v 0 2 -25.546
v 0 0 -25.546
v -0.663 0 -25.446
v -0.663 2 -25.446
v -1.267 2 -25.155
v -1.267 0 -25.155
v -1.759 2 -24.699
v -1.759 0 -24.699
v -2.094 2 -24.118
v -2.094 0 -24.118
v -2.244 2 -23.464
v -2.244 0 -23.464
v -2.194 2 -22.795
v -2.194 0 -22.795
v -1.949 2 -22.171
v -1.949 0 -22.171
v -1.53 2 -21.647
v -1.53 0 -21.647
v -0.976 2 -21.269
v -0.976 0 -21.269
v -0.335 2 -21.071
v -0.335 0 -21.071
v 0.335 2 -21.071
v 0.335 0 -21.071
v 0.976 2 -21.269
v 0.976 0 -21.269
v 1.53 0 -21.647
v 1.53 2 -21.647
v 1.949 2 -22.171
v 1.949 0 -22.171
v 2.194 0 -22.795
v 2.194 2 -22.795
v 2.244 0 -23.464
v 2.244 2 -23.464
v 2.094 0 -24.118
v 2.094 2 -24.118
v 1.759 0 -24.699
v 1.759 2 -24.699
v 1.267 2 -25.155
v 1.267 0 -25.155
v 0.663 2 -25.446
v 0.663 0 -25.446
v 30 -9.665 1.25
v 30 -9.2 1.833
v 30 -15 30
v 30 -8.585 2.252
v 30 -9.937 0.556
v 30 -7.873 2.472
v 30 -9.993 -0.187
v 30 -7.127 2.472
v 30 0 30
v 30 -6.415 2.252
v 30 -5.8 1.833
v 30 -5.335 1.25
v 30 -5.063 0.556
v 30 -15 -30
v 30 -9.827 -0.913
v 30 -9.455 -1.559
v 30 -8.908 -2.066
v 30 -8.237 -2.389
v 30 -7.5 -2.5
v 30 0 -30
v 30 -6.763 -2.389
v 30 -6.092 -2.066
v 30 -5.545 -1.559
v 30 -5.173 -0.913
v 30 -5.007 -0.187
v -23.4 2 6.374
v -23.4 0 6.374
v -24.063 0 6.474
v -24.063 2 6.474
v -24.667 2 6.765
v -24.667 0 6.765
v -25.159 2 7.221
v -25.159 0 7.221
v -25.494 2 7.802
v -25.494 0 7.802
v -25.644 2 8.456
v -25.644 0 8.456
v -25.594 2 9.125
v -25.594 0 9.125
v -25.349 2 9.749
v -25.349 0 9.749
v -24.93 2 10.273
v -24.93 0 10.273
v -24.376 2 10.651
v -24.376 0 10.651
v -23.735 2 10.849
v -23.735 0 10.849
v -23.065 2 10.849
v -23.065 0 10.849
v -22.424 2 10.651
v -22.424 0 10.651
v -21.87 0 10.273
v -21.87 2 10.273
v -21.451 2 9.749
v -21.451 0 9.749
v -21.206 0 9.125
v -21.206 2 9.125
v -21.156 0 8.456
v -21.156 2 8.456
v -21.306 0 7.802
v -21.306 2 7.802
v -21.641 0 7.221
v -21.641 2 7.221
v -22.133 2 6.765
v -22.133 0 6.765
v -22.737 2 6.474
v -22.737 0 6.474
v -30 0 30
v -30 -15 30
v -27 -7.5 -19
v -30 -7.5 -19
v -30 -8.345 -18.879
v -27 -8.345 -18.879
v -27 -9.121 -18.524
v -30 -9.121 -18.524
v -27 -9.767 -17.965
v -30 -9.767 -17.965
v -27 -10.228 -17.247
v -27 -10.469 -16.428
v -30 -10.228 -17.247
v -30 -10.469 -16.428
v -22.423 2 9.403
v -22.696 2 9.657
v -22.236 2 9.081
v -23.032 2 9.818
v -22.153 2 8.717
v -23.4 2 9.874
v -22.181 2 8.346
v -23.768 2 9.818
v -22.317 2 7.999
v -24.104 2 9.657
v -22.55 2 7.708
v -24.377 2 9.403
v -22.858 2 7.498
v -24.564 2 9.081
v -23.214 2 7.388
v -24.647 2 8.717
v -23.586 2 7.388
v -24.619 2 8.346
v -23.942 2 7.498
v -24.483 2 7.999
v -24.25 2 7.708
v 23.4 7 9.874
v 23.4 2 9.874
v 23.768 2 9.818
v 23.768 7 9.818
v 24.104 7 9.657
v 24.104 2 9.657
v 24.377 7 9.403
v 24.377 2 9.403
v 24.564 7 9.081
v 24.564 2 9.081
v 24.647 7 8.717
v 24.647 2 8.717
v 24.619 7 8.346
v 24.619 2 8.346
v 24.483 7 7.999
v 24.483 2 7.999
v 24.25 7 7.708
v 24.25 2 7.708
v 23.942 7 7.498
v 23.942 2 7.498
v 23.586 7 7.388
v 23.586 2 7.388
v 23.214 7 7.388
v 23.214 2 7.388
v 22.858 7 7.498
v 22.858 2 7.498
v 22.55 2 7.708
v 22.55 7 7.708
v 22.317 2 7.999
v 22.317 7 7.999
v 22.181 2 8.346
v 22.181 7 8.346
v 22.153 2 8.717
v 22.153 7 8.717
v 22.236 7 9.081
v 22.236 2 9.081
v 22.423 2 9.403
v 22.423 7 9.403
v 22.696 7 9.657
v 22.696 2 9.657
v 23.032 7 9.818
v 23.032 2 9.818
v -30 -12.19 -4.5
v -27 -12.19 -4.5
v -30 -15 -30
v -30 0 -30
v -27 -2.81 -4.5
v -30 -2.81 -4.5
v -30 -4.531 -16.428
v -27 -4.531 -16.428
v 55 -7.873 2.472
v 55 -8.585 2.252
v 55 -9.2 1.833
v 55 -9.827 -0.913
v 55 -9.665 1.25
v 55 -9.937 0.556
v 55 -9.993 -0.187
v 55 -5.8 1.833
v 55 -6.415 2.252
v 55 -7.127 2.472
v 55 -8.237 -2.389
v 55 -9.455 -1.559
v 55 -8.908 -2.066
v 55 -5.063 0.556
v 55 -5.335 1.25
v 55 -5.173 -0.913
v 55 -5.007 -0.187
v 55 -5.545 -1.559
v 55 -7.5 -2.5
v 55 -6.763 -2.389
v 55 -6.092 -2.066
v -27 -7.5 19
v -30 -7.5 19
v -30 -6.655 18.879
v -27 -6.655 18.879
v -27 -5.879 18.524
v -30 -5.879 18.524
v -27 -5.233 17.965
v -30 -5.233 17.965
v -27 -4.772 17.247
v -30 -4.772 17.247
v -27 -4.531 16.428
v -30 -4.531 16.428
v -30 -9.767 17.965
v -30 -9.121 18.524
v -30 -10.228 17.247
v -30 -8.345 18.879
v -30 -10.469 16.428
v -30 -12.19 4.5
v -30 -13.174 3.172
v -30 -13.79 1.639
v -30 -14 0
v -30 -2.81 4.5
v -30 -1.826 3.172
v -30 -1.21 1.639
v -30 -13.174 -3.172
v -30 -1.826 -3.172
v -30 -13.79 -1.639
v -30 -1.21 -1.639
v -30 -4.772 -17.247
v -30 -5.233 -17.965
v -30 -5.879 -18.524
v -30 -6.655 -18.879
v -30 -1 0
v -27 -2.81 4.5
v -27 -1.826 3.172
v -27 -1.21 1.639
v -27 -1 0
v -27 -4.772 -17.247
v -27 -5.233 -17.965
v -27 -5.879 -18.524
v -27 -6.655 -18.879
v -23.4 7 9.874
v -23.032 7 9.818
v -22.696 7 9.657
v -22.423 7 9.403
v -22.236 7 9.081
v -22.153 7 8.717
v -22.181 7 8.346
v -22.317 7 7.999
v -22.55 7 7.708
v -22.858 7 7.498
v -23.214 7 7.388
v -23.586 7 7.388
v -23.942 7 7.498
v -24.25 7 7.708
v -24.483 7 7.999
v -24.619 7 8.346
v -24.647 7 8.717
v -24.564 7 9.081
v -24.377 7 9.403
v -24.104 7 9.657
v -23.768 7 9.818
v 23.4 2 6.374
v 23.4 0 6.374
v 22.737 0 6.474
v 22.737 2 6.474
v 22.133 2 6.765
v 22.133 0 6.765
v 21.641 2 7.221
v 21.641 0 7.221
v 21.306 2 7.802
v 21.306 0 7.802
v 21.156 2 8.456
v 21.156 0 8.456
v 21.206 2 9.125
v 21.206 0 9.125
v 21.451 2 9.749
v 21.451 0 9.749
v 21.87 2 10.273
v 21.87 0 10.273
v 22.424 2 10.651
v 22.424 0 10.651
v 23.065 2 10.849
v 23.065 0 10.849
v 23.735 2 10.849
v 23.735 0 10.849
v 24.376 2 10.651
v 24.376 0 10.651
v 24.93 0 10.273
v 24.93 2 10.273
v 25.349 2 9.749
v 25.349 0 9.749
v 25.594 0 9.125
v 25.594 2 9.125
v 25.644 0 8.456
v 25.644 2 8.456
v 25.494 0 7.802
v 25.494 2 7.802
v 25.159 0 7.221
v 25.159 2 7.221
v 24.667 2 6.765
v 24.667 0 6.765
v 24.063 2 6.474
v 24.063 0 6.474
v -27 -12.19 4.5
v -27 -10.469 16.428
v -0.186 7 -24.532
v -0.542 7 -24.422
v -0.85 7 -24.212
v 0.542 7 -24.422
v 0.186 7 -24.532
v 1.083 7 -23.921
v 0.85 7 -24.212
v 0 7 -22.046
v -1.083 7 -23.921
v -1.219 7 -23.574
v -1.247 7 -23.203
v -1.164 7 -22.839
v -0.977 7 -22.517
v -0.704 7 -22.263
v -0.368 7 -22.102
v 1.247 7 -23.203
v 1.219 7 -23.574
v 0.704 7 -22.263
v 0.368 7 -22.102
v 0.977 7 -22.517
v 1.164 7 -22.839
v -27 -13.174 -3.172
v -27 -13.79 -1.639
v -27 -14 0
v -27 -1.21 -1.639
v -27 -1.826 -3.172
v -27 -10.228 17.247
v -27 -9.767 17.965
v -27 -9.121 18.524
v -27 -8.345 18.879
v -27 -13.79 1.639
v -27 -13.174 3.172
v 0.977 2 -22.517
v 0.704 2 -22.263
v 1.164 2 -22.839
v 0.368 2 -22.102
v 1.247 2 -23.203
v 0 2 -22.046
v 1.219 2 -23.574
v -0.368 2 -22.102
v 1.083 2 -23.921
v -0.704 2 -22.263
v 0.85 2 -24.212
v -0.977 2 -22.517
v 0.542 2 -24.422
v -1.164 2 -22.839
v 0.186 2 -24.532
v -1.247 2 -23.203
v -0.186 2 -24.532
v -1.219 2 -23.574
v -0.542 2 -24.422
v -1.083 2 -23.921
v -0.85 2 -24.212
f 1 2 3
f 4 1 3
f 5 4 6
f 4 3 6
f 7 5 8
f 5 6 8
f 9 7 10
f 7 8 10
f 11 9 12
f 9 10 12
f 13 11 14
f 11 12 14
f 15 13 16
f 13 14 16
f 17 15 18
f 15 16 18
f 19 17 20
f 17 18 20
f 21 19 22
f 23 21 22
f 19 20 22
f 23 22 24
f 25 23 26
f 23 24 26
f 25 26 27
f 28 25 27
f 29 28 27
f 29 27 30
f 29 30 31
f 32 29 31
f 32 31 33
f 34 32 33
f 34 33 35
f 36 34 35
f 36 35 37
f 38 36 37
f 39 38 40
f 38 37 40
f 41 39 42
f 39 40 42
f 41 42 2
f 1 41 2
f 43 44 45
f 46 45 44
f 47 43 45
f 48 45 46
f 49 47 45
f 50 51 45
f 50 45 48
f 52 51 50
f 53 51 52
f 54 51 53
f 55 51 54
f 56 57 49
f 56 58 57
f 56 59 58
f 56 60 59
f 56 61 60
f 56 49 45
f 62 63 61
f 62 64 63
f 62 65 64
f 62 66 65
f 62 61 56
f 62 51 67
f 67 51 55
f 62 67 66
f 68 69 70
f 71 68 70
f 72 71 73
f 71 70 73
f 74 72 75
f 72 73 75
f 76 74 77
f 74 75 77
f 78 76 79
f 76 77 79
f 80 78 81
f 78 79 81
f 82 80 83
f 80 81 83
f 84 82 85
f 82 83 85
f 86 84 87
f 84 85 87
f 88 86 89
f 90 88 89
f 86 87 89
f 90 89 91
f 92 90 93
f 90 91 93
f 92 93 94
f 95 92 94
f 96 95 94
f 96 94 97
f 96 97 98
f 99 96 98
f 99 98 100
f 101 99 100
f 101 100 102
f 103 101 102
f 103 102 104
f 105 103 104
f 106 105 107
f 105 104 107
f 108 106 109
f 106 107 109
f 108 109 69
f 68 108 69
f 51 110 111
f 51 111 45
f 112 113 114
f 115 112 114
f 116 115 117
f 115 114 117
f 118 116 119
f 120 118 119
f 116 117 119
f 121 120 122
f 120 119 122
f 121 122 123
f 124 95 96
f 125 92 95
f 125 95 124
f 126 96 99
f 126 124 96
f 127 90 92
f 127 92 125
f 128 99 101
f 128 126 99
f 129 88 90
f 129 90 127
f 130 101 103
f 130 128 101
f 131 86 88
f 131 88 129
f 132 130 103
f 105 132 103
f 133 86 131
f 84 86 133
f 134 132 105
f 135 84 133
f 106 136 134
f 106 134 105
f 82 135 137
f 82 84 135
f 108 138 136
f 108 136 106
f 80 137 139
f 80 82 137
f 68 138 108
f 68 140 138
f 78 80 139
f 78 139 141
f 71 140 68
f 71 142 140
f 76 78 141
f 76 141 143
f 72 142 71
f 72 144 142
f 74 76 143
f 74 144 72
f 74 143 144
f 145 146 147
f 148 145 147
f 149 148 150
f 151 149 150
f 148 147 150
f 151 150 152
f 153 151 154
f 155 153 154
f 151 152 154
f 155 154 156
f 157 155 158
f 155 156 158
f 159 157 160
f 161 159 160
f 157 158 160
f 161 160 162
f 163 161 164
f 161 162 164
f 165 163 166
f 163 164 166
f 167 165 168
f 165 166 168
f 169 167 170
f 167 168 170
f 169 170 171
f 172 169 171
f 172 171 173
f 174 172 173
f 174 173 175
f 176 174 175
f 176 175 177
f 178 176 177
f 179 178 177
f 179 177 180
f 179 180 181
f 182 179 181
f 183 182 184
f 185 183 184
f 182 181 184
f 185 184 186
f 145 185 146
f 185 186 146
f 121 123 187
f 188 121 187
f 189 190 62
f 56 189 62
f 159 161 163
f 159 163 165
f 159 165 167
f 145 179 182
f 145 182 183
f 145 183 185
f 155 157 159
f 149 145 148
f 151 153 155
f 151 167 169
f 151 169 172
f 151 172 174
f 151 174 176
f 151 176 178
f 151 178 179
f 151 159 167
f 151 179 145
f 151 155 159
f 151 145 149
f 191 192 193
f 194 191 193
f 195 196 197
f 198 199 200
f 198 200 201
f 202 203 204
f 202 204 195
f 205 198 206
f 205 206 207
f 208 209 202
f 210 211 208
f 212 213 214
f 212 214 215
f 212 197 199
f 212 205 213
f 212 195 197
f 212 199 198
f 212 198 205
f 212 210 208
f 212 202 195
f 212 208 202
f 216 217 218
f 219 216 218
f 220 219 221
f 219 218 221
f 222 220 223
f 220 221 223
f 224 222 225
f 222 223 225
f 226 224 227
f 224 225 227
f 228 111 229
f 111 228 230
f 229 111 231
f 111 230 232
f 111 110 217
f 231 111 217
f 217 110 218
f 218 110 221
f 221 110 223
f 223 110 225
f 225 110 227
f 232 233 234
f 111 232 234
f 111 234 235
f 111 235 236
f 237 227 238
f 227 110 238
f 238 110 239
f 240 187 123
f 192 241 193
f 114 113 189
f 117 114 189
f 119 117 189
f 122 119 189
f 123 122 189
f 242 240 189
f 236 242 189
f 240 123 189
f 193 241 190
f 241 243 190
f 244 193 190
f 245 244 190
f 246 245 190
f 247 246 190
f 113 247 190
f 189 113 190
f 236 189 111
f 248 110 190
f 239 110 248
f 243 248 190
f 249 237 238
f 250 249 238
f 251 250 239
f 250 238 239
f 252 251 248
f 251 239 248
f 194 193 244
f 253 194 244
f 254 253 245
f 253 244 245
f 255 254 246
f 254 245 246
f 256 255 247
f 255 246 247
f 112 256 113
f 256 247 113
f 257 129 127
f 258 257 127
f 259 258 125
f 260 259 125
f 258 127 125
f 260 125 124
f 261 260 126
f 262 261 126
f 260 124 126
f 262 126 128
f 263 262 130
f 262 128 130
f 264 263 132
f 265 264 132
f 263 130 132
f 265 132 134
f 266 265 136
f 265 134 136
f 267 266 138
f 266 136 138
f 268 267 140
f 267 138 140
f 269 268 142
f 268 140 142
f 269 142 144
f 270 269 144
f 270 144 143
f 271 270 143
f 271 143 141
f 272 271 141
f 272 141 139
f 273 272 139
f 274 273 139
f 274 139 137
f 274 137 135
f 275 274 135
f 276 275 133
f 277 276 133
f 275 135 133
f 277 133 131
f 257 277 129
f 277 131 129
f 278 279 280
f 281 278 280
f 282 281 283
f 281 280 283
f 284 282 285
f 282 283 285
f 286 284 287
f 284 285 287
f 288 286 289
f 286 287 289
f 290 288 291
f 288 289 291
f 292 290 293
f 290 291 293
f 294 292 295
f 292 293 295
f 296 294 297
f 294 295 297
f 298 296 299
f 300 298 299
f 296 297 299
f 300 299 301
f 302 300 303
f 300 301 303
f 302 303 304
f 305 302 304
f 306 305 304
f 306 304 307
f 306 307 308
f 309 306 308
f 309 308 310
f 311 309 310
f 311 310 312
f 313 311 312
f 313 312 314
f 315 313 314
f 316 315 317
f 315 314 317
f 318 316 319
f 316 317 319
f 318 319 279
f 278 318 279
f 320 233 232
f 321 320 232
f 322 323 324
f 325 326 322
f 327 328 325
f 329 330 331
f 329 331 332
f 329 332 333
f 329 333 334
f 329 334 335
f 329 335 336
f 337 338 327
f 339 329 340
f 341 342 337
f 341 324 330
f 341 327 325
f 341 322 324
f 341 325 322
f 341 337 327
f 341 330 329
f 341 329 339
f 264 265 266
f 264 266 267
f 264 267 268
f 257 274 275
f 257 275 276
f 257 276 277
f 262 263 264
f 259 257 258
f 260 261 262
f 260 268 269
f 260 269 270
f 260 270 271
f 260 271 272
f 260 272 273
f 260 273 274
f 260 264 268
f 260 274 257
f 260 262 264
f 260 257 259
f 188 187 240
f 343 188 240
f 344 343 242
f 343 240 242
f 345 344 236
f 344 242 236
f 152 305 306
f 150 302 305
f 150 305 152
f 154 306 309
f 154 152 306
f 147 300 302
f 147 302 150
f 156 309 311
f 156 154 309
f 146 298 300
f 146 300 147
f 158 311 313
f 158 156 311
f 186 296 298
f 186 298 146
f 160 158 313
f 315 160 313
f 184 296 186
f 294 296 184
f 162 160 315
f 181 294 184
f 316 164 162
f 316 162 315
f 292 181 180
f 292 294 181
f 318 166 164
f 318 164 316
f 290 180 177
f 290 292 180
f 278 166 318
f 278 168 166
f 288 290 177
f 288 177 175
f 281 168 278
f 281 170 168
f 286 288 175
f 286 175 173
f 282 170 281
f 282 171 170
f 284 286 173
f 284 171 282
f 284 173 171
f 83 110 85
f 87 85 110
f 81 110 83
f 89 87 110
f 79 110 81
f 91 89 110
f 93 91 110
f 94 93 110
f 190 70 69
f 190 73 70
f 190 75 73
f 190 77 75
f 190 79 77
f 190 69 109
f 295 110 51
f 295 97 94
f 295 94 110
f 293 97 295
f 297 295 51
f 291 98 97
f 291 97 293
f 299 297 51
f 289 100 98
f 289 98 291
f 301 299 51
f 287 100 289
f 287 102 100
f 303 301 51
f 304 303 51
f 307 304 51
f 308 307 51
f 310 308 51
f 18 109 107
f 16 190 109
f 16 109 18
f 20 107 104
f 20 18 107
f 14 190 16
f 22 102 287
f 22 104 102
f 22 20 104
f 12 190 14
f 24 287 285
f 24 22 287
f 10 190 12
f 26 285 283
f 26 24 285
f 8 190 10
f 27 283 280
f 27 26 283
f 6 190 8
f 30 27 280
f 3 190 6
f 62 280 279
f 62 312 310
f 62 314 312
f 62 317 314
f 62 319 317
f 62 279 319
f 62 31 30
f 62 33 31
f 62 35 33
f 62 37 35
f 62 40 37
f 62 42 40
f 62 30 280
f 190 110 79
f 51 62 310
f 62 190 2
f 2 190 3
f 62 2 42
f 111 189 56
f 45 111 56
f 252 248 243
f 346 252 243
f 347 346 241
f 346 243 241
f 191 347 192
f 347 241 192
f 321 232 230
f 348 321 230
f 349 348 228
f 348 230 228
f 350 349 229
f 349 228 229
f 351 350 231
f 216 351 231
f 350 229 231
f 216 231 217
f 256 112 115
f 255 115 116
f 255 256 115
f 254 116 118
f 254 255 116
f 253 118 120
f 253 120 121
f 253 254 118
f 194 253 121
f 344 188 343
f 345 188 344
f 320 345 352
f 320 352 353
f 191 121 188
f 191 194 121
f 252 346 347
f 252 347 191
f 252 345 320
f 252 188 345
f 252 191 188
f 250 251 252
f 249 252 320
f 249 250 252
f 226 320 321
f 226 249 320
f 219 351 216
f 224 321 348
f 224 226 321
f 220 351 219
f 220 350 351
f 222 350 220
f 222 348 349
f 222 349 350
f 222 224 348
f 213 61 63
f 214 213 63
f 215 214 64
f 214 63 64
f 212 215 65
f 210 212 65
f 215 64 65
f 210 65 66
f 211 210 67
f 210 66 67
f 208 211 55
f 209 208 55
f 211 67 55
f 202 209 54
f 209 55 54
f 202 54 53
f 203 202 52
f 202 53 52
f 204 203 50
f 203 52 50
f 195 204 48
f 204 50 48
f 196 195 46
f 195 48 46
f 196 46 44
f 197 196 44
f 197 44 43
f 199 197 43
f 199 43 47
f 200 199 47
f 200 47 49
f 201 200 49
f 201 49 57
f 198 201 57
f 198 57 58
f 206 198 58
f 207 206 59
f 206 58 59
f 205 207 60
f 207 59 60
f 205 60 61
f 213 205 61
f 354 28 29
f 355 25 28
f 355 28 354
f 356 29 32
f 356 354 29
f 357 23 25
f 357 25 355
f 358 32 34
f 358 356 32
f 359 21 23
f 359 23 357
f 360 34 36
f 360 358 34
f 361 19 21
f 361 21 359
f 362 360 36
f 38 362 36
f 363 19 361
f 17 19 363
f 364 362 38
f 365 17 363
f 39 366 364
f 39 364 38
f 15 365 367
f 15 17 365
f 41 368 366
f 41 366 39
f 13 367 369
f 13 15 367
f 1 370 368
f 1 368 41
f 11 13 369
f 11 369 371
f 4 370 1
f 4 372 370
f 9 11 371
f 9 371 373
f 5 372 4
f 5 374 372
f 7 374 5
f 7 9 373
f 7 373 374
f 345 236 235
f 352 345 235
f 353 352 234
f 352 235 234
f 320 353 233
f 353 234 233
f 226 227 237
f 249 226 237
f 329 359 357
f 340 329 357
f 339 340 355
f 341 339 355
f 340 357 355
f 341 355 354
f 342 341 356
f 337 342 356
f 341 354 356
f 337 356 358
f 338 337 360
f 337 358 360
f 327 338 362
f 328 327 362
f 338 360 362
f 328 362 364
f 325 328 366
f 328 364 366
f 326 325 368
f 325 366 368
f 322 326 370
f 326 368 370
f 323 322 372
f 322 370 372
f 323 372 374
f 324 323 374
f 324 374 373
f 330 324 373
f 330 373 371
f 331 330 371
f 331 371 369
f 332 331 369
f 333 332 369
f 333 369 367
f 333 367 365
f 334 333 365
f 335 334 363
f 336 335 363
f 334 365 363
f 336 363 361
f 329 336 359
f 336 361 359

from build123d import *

# Parameters (mm, degrees)
SKETCH2_W           = 60
SKETCH2_H           = 60
BOSS_EXTRUDE1_DEPTH = 15
CUT_EXTRUDE1_DEPTH  = 3
SKETCH1_R           = 2.25
BOSS_EXTRUDE2_DEPTH = 2
SKETCH4_R           = 1.25
BOSS_EXTRUDE3_DEPTH = 5
SKETCH5_R           = 2.5
BOSS_EXTRUDE4_DEPTH = 25


with BuildPart() as part:
    # Sketch2 → Boss-Extrude1 (new body)
    with BuildSketch(Plane(origin=(0, 0, 0), x_dir=(1, 0, 0), z_dir=(0, 1, 0))):
        Rectangle(SKETCH2_W, SKETCH2_H)
    extrude(amount=-BOSS_EXTRUDE1_DEPTH)

    # Sketch3 → Cut-Extrude1 (cut)
    with BuildSketch(Plane.ZY.offset(30)):
        with BuildLine():
            Line((-6.5, -7.5), (-13, -7.5))
            ThreePointArc((-13, -7.5), (-14.035987291, -9.767742066), (-16.428436053, -10.469249492))
            Line((-16.428436053, -10.469249492), (-4.5, -12.19041576))
            ThreePointArc((-4.5, -12.19041576), (-5.979130372, -10.049509757), (-6.5, -7.5))
        make_face()
        with BuildLine():
            ThreePointArc((-16.428436053, -10.469249492), (-14.035987291, -9.767742066), (-13, -7.5))
            Line((-13, -7.5), (-19, -7.5))
            ThreePointArc((-19, -7.5), (-18.267742066, -9.464012709), (-16.428436053, -10.469249492))
        make_face()
        with BuildLine():
            Line((-19, -7.5), (-13, -7.5))
            ThreePointArc((-13, -7.5), (-14.035987291, -5.232257934), (-16.428436053, -4.530750508))
            ThreePointArc((-16.428436053, -4.530750508), (-18.267742066, -5.535987291), (-19, -7.5))
        make_face()
        with BuildLine():
            ThreePointArc((-16.428436053, -4.530750508), (-14.035987291, -5.232257934), (-13, -7.5))
            Line((-13, -7.5), (-6.5, -7.5))
            ThreePointArc((-6.5, -7.5), (-5.979130372, -4.950490243), (-4.5, -2.80958424))
            Line((-4.5, -2.80958424), (-16.428436053, -4.530750508))
        make_face()
        with BuildLine():
            ThreePointArc((0, -12), (-3.18198051, -10.681980521), (-4.5, -7.500000016))
            Line((-4.5, -7.500000016), (-4.5, -12.19041576))
            ThreePointArc((-4.5, -12.19041576), (-2.425107994, -13.530659269), (0, -14))
            Line((0, -14), (0, -12))
        make_face()
        with BuildLine():
            Line((-4.5, -2.80958424), (-4.5, -7.500000016))
            ThreePointArc((-4.5, -7.500000016), (-3.181980521, -4.31801949), (0, -3))
            Line((0, -3), (0, -1))
            ThreePointArc((0, -1), (-2.425107994, -1.469340731), (-4.5, -2.80958424))
        make_face()
        with BuildLine():
            ThreePointArc((-4.5, -2.80958424), (-5.979130372, -4.950490243), (-6.5, -7.5))
            Line((-6.5, -7.5), (-4.5, -7.5))
            Line((-4.5, -7.500000016), (-4.5, -2.80958424))
        make_face()
        with BuildLine():
            Line((-4.5, -7.5), (-6.5, -7.5))
            ThreePointArc((-6.5, -7.5), (-5.979130372, -10.049509757), (-4.5, -12.19041576))
            Line((-4.5, -12.19041576), (-4.5, -7.500000016))
        make_face()
        with BuildLine():
            Line((0, -1), (0, -3))
            ThreePointArc((0, -3), (3.181980515, -4.318019485), (4.5, -7.5))
            Line((4.5, -7.5), (4.5, -2.80958424))
            ThreePointArc((4.5, -2.80958424), (2.425107994, -1.469340731), (0, -1))
        make_face()
        with BuildLine():
            ThreePointArc((4.5, -7.5), (3.181980515, -10.681980515), (0, -12))
            Line((0, -12), (0, -14))
            ThreePointArc((0, -14), (2.425107994, -13.530659269), (4.5, -12.19041576))
            Line((4.5, -12.19041576), (4.5, -7.5))
        make_face()
        with BuildLine():
            Line((0, -3), (0, -7.5))
            Line((0, -7.5), (4.5, -7.5))
            ThreePointArc((4.5, -7.5), (3.181980515, -4.318019485), (0, -3))
        make_face()
        with BuildLine():
            Line((4.5, -7.5), (0, -7.5))
            Line((0, -7.5), (0, -12))
            ThreePointArc((0, -12), (3.181980515, -10.681980515), (4.5, -7.5))
        make_face()
        with BuildLine():
            ThreePointArc((0, -3), (-3.181980521, -4.31801949), (-4.5, -7.500000016))
            Line((-4.5, -7.5), (0, -7.5))
            Line((0, -7.5), (0, -3))
        make_face()
        with BuildLine():
            Line((0, -7.5), (-4.5, -7.5))
            ThreePointArc((-4.5, -7.500000016), (-3.18198051, -10.681980521), (0, -12))
            Line((0, -12), (0, -7.5))
        make_face()
        with BuildLine():
            Line((4.5, -2.80958424), (4.5, -7.5))
            Line((4.5, -7.5), (6.5, -7.5))
            ThreePointArc((6.5, -7.5), (5.979130372, -4.950490243), (4.5, -2.80958424))
        make_face()
        with BuildLine():
            Line((6.5, -7.5), (4.5, -7.5))
            Line((4.5, -7.5), (4.5, -12.19041576))
            ThreePointArc((4.5, -12.19041576), (5.979130372, -10.049509757), (6.5, -7.5))
        make_face()
        with BuildLine():
            ThreePointArc((6.5, -7.5), (5.979130372, -10.049509757), (4.5, -12.19041576))
            Line((4.5, -12.19041576), (16.428436053, -10.469249492))
            ThreePointArc((16.428436053, -10.469249492), (14.035987291, -9.767742066), (13, -7.5))
            Line((13, -7.5), (6.5, -7.5))
        make_face()
        with BuildLine():
            Line((16.428436053, -4.530750508), (4.5, -2.80958424))
            ThreePointArc((4.5, -2.80958424), (5.979130372, -4.950490243), (6.5, -7.5))
            Line((6.5, -7.5), (13, -7.5))
            ThreePointArc((13, -7.5), (14.035987291, -5.232257934), (16.428436053, -4.530750508))
        make_face()
        with BuildLine():
            ThreePointArc((19, -7.5), (18.267742066, -5.535987291), (16.428436053, -4.530750508))
            ThreePointArc((16.428436053, -4.530750508), (14.035987291, -5.232257934), (13, -7.5))
            Line((13, -7.5), (19, -7.5))
        make_face()
        with BuildLine():
            ThreePointArc((13, -7.5), (14.035987291, -9.767742066), (16.428436053, -10.469249492))
            ThreePointArc((16.428436053, -10.469249492), (18.267742066, -9.464012709), (19, -7.5))
            Line((19, -7.5), (13, -7.5))
        make_face()
    extrude(amount=-CUT_EXTRUDE1_DEPTH, mode=Mode.SUBTRACT)

    # Sketch1 → Boss-Extrude2 (add)
    with BuildSketch(Plane(origin=(0, 0, 0), x_dir=(1, 0, 0), z_dir=(0, 1, 0))):
        with Locations(Location((-23.4, -8.623991148, 0), (0, 0, 90))):
            Circle(SKETCH1_R)
        with Locations(Location((0, 23.296008852, 0), (0, 0, 90))):
            Circle(SKETCH1_R)
        with Locations(Location((23.4, -8.623991148, 0), (0, 0, 90))):
            Circle(SKETCH1_R)
    extrude(amount=BOSS_EXTRUDE2_DEPTH)

    # Sketch4 → Boss-Extrude3 (add)
    with BuildSketch(Plane(origin=(0, 2, 0), x_dir=(1, 0, 0), z_dir=(0, 1, 0))):
        with Locations(Location((-23.4, -8.623991148, 0), (0, 0, 270))):
            Circle(SKETCH4_R)
        with Locations(Location((23.4, -8.623991148, 0), (0, 0, 270))):
            Circle(SKETCH4_R)
        with Locations(Location((0, 23.296008852, 0), (0, 0, 270))):
            Circle(SKETCH4_R)
    extrude(amount=BOSS_EXTRUDE3_DEPTH)

    # Sketch5 → Boss-Extrude4 (add)
    with BuildSketch(Plane(origin=(30, 0, 0), x_dir=(0, 0, -1), z_dir=(1, 0, 0))):
        with Locations((0, -7.5)):
            Circle(SKETCH5_R)
    extrude(amount=BOSS_EXTRUDE4_DEPTH)


solid = part.part
